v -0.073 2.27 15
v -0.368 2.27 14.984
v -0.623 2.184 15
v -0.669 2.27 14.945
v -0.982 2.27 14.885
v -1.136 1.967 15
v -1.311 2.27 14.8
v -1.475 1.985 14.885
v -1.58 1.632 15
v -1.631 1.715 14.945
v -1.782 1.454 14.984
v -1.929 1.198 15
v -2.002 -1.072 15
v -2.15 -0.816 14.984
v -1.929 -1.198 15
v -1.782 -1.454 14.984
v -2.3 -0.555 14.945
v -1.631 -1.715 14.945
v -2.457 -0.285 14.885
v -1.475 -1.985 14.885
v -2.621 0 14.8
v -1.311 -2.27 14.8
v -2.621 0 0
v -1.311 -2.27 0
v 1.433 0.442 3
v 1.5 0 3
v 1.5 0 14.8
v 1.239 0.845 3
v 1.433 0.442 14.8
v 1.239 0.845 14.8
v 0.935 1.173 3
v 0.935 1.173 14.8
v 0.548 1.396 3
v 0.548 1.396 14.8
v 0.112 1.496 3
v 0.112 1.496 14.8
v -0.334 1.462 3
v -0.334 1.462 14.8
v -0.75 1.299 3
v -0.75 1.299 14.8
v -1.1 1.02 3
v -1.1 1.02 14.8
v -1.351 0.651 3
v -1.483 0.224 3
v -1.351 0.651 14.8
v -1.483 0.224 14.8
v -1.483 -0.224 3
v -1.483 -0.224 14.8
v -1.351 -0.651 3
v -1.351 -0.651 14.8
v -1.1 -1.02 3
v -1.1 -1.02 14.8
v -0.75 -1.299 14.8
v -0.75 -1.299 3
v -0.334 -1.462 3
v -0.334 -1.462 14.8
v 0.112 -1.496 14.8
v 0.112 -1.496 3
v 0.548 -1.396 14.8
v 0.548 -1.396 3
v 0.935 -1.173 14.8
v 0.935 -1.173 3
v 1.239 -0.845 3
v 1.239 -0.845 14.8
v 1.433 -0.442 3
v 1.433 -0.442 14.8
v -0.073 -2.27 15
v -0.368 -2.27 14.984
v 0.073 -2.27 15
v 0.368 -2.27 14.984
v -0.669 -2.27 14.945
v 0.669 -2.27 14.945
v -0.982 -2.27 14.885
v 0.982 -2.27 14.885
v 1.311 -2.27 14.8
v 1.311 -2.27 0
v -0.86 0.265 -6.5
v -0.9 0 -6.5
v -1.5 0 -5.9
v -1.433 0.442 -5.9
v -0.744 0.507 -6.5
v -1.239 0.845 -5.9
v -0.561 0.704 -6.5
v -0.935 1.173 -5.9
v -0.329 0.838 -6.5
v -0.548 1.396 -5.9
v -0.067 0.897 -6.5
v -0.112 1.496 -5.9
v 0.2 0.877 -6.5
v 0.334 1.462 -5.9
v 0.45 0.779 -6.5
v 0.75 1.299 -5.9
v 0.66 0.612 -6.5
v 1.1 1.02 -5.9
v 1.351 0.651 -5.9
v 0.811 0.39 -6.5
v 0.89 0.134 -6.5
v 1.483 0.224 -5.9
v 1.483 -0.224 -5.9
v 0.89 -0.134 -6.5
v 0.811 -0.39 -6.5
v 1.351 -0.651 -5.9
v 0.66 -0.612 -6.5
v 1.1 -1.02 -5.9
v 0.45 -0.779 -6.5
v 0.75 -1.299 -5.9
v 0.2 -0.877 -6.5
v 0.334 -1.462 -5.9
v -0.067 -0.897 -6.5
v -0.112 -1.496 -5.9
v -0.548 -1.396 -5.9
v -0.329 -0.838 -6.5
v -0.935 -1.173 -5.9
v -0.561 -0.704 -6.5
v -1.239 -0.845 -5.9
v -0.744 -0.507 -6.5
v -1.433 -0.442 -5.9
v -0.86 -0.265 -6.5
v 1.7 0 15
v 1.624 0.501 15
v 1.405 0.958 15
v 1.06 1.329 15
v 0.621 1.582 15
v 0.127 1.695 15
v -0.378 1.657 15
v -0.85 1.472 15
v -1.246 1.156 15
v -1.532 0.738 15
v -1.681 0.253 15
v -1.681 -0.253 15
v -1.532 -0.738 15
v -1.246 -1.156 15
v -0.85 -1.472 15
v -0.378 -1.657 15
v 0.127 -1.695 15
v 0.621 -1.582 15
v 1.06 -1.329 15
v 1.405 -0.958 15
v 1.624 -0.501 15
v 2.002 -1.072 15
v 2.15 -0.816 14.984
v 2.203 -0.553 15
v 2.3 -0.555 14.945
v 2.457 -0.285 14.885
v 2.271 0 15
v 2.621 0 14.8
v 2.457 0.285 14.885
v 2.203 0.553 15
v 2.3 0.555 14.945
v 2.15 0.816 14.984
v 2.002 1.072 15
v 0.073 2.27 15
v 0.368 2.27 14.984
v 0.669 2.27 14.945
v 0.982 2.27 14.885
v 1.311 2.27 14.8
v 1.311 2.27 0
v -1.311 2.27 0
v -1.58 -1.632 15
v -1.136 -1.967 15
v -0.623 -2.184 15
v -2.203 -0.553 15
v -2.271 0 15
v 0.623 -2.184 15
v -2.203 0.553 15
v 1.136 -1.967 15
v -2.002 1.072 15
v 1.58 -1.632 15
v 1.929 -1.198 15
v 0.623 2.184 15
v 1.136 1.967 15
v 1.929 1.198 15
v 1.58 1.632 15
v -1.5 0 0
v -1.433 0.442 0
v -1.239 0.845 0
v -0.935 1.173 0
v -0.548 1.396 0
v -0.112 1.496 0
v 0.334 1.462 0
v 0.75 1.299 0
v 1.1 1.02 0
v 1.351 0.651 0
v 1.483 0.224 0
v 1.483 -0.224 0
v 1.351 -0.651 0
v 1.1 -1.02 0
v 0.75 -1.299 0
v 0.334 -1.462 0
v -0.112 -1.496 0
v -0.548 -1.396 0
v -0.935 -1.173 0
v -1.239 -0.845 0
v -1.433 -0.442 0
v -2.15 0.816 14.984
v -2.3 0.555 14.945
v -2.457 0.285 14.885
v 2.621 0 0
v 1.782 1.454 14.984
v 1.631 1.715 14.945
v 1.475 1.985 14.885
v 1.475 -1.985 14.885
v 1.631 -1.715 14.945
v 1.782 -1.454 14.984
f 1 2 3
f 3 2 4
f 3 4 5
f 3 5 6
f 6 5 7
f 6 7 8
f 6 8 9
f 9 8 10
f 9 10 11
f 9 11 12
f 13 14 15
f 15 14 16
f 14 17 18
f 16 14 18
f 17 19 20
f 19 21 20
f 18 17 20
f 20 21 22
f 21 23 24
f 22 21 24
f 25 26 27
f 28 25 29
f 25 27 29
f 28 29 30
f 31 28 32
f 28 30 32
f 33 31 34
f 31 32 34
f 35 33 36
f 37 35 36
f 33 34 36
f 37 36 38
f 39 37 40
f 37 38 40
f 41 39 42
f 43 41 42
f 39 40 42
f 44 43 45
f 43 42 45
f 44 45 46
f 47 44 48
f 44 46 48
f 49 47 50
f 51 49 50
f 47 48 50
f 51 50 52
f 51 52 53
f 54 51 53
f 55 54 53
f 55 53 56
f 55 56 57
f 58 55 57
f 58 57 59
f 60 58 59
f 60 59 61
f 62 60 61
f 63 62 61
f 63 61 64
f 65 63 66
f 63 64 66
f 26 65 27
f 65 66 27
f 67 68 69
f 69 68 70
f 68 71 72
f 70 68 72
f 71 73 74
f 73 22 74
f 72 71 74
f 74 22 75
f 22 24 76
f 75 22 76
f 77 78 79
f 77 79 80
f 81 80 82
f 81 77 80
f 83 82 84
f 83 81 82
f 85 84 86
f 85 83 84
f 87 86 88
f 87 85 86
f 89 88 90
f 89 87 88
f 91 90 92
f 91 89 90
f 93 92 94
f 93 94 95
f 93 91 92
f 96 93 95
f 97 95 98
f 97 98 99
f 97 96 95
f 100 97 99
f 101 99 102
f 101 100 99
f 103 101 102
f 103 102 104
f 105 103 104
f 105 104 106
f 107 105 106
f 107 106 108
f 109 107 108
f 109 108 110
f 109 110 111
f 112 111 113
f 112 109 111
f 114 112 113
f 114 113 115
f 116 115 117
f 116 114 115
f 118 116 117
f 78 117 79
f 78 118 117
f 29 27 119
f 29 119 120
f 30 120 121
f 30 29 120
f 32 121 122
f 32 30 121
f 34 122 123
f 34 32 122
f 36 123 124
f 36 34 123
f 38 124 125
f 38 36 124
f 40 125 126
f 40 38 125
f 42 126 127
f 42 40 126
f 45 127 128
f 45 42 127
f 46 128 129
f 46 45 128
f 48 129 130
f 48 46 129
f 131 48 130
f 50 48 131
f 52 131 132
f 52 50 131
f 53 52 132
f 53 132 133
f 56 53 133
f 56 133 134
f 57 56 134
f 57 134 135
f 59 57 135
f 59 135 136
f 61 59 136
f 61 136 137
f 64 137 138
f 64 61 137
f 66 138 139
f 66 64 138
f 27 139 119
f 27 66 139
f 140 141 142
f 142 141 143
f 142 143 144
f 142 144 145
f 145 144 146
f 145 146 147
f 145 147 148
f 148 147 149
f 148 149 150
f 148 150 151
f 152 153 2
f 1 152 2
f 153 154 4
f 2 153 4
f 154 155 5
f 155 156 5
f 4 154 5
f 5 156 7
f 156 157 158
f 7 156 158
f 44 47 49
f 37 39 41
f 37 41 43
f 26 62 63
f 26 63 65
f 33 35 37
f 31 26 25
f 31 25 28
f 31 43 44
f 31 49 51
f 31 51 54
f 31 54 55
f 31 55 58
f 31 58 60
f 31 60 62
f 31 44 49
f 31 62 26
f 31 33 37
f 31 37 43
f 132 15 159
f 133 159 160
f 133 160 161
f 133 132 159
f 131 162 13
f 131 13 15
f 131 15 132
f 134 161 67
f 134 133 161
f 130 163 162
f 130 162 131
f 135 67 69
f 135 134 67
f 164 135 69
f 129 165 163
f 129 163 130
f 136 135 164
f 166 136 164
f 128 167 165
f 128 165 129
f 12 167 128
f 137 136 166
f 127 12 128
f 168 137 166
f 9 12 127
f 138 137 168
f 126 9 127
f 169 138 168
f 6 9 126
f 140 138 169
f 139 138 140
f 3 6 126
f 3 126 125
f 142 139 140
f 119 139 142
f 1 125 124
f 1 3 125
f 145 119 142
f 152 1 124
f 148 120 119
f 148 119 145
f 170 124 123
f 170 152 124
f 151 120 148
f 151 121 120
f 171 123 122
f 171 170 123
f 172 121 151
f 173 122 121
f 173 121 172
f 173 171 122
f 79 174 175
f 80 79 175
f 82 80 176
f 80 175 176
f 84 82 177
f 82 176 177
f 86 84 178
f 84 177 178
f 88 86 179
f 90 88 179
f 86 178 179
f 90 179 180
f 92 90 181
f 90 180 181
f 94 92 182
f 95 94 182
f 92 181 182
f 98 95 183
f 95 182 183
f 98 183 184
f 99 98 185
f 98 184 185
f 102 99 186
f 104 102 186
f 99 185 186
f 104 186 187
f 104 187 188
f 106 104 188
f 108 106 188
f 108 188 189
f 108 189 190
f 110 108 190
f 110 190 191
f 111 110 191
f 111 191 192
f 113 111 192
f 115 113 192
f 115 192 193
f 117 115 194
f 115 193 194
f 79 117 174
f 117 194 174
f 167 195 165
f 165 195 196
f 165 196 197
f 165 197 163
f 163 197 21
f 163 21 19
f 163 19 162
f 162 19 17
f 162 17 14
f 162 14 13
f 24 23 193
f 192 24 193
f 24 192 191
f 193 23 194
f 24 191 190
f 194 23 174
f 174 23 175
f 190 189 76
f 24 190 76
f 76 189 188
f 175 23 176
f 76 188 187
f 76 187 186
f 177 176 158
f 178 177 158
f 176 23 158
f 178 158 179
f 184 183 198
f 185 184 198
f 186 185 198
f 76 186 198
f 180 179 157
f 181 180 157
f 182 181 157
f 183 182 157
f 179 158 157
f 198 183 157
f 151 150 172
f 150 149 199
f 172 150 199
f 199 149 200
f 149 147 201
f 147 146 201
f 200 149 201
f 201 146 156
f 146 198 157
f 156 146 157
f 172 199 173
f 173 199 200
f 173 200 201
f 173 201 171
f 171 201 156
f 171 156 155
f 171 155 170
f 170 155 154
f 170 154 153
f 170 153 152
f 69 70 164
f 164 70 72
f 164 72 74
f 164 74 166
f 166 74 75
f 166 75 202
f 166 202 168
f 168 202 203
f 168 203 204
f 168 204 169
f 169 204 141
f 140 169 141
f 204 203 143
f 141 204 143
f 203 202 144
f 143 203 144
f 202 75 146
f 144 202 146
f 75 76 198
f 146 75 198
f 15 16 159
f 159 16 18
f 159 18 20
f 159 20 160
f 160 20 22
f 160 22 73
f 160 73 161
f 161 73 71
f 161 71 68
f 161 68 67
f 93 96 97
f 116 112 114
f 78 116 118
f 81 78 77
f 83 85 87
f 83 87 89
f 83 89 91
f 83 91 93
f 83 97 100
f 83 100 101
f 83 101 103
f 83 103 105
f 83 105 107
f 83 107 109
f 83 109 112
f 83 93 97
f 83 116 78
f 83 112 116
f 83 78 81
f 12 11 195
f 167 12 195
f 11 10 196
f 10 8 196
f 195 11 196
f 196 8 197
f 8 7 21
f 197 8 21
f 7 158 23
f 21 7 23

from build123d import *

# Parameters (mm, degrees)
BOSS_EXTRUDE1_DEPTH     = 15
SKETCH2_R               = 1.5
CUT_EXTRUDE1_DEPTH      = 1
CUT_EXTRUDE1_DEPTH_BACK = 12
CHAMFER1_SIZE           = 0.2
SKETCH4_R               = 1.5
BOSS_EXTRUDE2_DEPTH     = 6.5
CHAMFER2_SIZE           = 0.6


with BuildPart() as part:
    # Sketch1 → Boss-Extrude1 (new body)
    with BuildSketch(Plane.XY):
        Polygon((2.621170222, 0), (1.310585111, 2.27), (-1.310585111, 2.27), (-2.621170222, 0), (-1.310585111, -2.27), (1.310585111, -2.27), align=None)
    extrude(amount=BOSS_EXTRUDE1_DEPTH)

    # Sketch2 → Cut-Extrude1 (cut, two sides)
    with BuildSketch(Plane.XY.offset(15)) as cut_extrude1_sk:
        Circle(SKETCH2_R)
    extrude(amount=CUT_EXTRUDE1_DEPTH, mode=Mode.SUBTRACT)
    extrude(cut_extrude1_sk.sketch, amount=-CUT_EXTRUDE1_DEPTH_BACK, mode=Mode.SUBTRACT)

    # Sketch3 → Cut-Revolve1 (revolve, cut)
    with BuildSketch(Plane(origin=(0, 0, 0), x_dir=(1, 0, 0), z_dir=(0, 1, 0))):
        Polygon((-2.621170222, -15), (-2.271170222, -15), (-2.621170222, -14.8), align=None)
    revolve(axis=Axis((0, 0, 3), (0, 0, 1)), mode=Mode.SUBTRACT)

    # Chamfer1
    chamfer1_edges = [part.edges().sort_by_distance(p)[0] for p in [
        (-1.5, 0, 15),
    ]]
    chamfer(chamfer1_edges, length=CHAMFER1_SIZE)

    # Sketch4 → Boss-Extrude2 (add)
    with BuildSketch(Plane(origin=(0, 0, 0), x_dir=(-1, 0, 0), z_dir=(0, 0, -1))):
        Circle(SKETCH4_R)
    extrude(amount=BOSS_EXTRUDE2_DEPTH)

    # Chamfer2
    chamfer2_edges = [part.edges().sort_by_distance(p)[0] for p in [
        (1.5, 0, -6.5),
    ]]
    chamfer(chamfer2_edges, length=CHAMFER2_SIZE)


solid = part.part
